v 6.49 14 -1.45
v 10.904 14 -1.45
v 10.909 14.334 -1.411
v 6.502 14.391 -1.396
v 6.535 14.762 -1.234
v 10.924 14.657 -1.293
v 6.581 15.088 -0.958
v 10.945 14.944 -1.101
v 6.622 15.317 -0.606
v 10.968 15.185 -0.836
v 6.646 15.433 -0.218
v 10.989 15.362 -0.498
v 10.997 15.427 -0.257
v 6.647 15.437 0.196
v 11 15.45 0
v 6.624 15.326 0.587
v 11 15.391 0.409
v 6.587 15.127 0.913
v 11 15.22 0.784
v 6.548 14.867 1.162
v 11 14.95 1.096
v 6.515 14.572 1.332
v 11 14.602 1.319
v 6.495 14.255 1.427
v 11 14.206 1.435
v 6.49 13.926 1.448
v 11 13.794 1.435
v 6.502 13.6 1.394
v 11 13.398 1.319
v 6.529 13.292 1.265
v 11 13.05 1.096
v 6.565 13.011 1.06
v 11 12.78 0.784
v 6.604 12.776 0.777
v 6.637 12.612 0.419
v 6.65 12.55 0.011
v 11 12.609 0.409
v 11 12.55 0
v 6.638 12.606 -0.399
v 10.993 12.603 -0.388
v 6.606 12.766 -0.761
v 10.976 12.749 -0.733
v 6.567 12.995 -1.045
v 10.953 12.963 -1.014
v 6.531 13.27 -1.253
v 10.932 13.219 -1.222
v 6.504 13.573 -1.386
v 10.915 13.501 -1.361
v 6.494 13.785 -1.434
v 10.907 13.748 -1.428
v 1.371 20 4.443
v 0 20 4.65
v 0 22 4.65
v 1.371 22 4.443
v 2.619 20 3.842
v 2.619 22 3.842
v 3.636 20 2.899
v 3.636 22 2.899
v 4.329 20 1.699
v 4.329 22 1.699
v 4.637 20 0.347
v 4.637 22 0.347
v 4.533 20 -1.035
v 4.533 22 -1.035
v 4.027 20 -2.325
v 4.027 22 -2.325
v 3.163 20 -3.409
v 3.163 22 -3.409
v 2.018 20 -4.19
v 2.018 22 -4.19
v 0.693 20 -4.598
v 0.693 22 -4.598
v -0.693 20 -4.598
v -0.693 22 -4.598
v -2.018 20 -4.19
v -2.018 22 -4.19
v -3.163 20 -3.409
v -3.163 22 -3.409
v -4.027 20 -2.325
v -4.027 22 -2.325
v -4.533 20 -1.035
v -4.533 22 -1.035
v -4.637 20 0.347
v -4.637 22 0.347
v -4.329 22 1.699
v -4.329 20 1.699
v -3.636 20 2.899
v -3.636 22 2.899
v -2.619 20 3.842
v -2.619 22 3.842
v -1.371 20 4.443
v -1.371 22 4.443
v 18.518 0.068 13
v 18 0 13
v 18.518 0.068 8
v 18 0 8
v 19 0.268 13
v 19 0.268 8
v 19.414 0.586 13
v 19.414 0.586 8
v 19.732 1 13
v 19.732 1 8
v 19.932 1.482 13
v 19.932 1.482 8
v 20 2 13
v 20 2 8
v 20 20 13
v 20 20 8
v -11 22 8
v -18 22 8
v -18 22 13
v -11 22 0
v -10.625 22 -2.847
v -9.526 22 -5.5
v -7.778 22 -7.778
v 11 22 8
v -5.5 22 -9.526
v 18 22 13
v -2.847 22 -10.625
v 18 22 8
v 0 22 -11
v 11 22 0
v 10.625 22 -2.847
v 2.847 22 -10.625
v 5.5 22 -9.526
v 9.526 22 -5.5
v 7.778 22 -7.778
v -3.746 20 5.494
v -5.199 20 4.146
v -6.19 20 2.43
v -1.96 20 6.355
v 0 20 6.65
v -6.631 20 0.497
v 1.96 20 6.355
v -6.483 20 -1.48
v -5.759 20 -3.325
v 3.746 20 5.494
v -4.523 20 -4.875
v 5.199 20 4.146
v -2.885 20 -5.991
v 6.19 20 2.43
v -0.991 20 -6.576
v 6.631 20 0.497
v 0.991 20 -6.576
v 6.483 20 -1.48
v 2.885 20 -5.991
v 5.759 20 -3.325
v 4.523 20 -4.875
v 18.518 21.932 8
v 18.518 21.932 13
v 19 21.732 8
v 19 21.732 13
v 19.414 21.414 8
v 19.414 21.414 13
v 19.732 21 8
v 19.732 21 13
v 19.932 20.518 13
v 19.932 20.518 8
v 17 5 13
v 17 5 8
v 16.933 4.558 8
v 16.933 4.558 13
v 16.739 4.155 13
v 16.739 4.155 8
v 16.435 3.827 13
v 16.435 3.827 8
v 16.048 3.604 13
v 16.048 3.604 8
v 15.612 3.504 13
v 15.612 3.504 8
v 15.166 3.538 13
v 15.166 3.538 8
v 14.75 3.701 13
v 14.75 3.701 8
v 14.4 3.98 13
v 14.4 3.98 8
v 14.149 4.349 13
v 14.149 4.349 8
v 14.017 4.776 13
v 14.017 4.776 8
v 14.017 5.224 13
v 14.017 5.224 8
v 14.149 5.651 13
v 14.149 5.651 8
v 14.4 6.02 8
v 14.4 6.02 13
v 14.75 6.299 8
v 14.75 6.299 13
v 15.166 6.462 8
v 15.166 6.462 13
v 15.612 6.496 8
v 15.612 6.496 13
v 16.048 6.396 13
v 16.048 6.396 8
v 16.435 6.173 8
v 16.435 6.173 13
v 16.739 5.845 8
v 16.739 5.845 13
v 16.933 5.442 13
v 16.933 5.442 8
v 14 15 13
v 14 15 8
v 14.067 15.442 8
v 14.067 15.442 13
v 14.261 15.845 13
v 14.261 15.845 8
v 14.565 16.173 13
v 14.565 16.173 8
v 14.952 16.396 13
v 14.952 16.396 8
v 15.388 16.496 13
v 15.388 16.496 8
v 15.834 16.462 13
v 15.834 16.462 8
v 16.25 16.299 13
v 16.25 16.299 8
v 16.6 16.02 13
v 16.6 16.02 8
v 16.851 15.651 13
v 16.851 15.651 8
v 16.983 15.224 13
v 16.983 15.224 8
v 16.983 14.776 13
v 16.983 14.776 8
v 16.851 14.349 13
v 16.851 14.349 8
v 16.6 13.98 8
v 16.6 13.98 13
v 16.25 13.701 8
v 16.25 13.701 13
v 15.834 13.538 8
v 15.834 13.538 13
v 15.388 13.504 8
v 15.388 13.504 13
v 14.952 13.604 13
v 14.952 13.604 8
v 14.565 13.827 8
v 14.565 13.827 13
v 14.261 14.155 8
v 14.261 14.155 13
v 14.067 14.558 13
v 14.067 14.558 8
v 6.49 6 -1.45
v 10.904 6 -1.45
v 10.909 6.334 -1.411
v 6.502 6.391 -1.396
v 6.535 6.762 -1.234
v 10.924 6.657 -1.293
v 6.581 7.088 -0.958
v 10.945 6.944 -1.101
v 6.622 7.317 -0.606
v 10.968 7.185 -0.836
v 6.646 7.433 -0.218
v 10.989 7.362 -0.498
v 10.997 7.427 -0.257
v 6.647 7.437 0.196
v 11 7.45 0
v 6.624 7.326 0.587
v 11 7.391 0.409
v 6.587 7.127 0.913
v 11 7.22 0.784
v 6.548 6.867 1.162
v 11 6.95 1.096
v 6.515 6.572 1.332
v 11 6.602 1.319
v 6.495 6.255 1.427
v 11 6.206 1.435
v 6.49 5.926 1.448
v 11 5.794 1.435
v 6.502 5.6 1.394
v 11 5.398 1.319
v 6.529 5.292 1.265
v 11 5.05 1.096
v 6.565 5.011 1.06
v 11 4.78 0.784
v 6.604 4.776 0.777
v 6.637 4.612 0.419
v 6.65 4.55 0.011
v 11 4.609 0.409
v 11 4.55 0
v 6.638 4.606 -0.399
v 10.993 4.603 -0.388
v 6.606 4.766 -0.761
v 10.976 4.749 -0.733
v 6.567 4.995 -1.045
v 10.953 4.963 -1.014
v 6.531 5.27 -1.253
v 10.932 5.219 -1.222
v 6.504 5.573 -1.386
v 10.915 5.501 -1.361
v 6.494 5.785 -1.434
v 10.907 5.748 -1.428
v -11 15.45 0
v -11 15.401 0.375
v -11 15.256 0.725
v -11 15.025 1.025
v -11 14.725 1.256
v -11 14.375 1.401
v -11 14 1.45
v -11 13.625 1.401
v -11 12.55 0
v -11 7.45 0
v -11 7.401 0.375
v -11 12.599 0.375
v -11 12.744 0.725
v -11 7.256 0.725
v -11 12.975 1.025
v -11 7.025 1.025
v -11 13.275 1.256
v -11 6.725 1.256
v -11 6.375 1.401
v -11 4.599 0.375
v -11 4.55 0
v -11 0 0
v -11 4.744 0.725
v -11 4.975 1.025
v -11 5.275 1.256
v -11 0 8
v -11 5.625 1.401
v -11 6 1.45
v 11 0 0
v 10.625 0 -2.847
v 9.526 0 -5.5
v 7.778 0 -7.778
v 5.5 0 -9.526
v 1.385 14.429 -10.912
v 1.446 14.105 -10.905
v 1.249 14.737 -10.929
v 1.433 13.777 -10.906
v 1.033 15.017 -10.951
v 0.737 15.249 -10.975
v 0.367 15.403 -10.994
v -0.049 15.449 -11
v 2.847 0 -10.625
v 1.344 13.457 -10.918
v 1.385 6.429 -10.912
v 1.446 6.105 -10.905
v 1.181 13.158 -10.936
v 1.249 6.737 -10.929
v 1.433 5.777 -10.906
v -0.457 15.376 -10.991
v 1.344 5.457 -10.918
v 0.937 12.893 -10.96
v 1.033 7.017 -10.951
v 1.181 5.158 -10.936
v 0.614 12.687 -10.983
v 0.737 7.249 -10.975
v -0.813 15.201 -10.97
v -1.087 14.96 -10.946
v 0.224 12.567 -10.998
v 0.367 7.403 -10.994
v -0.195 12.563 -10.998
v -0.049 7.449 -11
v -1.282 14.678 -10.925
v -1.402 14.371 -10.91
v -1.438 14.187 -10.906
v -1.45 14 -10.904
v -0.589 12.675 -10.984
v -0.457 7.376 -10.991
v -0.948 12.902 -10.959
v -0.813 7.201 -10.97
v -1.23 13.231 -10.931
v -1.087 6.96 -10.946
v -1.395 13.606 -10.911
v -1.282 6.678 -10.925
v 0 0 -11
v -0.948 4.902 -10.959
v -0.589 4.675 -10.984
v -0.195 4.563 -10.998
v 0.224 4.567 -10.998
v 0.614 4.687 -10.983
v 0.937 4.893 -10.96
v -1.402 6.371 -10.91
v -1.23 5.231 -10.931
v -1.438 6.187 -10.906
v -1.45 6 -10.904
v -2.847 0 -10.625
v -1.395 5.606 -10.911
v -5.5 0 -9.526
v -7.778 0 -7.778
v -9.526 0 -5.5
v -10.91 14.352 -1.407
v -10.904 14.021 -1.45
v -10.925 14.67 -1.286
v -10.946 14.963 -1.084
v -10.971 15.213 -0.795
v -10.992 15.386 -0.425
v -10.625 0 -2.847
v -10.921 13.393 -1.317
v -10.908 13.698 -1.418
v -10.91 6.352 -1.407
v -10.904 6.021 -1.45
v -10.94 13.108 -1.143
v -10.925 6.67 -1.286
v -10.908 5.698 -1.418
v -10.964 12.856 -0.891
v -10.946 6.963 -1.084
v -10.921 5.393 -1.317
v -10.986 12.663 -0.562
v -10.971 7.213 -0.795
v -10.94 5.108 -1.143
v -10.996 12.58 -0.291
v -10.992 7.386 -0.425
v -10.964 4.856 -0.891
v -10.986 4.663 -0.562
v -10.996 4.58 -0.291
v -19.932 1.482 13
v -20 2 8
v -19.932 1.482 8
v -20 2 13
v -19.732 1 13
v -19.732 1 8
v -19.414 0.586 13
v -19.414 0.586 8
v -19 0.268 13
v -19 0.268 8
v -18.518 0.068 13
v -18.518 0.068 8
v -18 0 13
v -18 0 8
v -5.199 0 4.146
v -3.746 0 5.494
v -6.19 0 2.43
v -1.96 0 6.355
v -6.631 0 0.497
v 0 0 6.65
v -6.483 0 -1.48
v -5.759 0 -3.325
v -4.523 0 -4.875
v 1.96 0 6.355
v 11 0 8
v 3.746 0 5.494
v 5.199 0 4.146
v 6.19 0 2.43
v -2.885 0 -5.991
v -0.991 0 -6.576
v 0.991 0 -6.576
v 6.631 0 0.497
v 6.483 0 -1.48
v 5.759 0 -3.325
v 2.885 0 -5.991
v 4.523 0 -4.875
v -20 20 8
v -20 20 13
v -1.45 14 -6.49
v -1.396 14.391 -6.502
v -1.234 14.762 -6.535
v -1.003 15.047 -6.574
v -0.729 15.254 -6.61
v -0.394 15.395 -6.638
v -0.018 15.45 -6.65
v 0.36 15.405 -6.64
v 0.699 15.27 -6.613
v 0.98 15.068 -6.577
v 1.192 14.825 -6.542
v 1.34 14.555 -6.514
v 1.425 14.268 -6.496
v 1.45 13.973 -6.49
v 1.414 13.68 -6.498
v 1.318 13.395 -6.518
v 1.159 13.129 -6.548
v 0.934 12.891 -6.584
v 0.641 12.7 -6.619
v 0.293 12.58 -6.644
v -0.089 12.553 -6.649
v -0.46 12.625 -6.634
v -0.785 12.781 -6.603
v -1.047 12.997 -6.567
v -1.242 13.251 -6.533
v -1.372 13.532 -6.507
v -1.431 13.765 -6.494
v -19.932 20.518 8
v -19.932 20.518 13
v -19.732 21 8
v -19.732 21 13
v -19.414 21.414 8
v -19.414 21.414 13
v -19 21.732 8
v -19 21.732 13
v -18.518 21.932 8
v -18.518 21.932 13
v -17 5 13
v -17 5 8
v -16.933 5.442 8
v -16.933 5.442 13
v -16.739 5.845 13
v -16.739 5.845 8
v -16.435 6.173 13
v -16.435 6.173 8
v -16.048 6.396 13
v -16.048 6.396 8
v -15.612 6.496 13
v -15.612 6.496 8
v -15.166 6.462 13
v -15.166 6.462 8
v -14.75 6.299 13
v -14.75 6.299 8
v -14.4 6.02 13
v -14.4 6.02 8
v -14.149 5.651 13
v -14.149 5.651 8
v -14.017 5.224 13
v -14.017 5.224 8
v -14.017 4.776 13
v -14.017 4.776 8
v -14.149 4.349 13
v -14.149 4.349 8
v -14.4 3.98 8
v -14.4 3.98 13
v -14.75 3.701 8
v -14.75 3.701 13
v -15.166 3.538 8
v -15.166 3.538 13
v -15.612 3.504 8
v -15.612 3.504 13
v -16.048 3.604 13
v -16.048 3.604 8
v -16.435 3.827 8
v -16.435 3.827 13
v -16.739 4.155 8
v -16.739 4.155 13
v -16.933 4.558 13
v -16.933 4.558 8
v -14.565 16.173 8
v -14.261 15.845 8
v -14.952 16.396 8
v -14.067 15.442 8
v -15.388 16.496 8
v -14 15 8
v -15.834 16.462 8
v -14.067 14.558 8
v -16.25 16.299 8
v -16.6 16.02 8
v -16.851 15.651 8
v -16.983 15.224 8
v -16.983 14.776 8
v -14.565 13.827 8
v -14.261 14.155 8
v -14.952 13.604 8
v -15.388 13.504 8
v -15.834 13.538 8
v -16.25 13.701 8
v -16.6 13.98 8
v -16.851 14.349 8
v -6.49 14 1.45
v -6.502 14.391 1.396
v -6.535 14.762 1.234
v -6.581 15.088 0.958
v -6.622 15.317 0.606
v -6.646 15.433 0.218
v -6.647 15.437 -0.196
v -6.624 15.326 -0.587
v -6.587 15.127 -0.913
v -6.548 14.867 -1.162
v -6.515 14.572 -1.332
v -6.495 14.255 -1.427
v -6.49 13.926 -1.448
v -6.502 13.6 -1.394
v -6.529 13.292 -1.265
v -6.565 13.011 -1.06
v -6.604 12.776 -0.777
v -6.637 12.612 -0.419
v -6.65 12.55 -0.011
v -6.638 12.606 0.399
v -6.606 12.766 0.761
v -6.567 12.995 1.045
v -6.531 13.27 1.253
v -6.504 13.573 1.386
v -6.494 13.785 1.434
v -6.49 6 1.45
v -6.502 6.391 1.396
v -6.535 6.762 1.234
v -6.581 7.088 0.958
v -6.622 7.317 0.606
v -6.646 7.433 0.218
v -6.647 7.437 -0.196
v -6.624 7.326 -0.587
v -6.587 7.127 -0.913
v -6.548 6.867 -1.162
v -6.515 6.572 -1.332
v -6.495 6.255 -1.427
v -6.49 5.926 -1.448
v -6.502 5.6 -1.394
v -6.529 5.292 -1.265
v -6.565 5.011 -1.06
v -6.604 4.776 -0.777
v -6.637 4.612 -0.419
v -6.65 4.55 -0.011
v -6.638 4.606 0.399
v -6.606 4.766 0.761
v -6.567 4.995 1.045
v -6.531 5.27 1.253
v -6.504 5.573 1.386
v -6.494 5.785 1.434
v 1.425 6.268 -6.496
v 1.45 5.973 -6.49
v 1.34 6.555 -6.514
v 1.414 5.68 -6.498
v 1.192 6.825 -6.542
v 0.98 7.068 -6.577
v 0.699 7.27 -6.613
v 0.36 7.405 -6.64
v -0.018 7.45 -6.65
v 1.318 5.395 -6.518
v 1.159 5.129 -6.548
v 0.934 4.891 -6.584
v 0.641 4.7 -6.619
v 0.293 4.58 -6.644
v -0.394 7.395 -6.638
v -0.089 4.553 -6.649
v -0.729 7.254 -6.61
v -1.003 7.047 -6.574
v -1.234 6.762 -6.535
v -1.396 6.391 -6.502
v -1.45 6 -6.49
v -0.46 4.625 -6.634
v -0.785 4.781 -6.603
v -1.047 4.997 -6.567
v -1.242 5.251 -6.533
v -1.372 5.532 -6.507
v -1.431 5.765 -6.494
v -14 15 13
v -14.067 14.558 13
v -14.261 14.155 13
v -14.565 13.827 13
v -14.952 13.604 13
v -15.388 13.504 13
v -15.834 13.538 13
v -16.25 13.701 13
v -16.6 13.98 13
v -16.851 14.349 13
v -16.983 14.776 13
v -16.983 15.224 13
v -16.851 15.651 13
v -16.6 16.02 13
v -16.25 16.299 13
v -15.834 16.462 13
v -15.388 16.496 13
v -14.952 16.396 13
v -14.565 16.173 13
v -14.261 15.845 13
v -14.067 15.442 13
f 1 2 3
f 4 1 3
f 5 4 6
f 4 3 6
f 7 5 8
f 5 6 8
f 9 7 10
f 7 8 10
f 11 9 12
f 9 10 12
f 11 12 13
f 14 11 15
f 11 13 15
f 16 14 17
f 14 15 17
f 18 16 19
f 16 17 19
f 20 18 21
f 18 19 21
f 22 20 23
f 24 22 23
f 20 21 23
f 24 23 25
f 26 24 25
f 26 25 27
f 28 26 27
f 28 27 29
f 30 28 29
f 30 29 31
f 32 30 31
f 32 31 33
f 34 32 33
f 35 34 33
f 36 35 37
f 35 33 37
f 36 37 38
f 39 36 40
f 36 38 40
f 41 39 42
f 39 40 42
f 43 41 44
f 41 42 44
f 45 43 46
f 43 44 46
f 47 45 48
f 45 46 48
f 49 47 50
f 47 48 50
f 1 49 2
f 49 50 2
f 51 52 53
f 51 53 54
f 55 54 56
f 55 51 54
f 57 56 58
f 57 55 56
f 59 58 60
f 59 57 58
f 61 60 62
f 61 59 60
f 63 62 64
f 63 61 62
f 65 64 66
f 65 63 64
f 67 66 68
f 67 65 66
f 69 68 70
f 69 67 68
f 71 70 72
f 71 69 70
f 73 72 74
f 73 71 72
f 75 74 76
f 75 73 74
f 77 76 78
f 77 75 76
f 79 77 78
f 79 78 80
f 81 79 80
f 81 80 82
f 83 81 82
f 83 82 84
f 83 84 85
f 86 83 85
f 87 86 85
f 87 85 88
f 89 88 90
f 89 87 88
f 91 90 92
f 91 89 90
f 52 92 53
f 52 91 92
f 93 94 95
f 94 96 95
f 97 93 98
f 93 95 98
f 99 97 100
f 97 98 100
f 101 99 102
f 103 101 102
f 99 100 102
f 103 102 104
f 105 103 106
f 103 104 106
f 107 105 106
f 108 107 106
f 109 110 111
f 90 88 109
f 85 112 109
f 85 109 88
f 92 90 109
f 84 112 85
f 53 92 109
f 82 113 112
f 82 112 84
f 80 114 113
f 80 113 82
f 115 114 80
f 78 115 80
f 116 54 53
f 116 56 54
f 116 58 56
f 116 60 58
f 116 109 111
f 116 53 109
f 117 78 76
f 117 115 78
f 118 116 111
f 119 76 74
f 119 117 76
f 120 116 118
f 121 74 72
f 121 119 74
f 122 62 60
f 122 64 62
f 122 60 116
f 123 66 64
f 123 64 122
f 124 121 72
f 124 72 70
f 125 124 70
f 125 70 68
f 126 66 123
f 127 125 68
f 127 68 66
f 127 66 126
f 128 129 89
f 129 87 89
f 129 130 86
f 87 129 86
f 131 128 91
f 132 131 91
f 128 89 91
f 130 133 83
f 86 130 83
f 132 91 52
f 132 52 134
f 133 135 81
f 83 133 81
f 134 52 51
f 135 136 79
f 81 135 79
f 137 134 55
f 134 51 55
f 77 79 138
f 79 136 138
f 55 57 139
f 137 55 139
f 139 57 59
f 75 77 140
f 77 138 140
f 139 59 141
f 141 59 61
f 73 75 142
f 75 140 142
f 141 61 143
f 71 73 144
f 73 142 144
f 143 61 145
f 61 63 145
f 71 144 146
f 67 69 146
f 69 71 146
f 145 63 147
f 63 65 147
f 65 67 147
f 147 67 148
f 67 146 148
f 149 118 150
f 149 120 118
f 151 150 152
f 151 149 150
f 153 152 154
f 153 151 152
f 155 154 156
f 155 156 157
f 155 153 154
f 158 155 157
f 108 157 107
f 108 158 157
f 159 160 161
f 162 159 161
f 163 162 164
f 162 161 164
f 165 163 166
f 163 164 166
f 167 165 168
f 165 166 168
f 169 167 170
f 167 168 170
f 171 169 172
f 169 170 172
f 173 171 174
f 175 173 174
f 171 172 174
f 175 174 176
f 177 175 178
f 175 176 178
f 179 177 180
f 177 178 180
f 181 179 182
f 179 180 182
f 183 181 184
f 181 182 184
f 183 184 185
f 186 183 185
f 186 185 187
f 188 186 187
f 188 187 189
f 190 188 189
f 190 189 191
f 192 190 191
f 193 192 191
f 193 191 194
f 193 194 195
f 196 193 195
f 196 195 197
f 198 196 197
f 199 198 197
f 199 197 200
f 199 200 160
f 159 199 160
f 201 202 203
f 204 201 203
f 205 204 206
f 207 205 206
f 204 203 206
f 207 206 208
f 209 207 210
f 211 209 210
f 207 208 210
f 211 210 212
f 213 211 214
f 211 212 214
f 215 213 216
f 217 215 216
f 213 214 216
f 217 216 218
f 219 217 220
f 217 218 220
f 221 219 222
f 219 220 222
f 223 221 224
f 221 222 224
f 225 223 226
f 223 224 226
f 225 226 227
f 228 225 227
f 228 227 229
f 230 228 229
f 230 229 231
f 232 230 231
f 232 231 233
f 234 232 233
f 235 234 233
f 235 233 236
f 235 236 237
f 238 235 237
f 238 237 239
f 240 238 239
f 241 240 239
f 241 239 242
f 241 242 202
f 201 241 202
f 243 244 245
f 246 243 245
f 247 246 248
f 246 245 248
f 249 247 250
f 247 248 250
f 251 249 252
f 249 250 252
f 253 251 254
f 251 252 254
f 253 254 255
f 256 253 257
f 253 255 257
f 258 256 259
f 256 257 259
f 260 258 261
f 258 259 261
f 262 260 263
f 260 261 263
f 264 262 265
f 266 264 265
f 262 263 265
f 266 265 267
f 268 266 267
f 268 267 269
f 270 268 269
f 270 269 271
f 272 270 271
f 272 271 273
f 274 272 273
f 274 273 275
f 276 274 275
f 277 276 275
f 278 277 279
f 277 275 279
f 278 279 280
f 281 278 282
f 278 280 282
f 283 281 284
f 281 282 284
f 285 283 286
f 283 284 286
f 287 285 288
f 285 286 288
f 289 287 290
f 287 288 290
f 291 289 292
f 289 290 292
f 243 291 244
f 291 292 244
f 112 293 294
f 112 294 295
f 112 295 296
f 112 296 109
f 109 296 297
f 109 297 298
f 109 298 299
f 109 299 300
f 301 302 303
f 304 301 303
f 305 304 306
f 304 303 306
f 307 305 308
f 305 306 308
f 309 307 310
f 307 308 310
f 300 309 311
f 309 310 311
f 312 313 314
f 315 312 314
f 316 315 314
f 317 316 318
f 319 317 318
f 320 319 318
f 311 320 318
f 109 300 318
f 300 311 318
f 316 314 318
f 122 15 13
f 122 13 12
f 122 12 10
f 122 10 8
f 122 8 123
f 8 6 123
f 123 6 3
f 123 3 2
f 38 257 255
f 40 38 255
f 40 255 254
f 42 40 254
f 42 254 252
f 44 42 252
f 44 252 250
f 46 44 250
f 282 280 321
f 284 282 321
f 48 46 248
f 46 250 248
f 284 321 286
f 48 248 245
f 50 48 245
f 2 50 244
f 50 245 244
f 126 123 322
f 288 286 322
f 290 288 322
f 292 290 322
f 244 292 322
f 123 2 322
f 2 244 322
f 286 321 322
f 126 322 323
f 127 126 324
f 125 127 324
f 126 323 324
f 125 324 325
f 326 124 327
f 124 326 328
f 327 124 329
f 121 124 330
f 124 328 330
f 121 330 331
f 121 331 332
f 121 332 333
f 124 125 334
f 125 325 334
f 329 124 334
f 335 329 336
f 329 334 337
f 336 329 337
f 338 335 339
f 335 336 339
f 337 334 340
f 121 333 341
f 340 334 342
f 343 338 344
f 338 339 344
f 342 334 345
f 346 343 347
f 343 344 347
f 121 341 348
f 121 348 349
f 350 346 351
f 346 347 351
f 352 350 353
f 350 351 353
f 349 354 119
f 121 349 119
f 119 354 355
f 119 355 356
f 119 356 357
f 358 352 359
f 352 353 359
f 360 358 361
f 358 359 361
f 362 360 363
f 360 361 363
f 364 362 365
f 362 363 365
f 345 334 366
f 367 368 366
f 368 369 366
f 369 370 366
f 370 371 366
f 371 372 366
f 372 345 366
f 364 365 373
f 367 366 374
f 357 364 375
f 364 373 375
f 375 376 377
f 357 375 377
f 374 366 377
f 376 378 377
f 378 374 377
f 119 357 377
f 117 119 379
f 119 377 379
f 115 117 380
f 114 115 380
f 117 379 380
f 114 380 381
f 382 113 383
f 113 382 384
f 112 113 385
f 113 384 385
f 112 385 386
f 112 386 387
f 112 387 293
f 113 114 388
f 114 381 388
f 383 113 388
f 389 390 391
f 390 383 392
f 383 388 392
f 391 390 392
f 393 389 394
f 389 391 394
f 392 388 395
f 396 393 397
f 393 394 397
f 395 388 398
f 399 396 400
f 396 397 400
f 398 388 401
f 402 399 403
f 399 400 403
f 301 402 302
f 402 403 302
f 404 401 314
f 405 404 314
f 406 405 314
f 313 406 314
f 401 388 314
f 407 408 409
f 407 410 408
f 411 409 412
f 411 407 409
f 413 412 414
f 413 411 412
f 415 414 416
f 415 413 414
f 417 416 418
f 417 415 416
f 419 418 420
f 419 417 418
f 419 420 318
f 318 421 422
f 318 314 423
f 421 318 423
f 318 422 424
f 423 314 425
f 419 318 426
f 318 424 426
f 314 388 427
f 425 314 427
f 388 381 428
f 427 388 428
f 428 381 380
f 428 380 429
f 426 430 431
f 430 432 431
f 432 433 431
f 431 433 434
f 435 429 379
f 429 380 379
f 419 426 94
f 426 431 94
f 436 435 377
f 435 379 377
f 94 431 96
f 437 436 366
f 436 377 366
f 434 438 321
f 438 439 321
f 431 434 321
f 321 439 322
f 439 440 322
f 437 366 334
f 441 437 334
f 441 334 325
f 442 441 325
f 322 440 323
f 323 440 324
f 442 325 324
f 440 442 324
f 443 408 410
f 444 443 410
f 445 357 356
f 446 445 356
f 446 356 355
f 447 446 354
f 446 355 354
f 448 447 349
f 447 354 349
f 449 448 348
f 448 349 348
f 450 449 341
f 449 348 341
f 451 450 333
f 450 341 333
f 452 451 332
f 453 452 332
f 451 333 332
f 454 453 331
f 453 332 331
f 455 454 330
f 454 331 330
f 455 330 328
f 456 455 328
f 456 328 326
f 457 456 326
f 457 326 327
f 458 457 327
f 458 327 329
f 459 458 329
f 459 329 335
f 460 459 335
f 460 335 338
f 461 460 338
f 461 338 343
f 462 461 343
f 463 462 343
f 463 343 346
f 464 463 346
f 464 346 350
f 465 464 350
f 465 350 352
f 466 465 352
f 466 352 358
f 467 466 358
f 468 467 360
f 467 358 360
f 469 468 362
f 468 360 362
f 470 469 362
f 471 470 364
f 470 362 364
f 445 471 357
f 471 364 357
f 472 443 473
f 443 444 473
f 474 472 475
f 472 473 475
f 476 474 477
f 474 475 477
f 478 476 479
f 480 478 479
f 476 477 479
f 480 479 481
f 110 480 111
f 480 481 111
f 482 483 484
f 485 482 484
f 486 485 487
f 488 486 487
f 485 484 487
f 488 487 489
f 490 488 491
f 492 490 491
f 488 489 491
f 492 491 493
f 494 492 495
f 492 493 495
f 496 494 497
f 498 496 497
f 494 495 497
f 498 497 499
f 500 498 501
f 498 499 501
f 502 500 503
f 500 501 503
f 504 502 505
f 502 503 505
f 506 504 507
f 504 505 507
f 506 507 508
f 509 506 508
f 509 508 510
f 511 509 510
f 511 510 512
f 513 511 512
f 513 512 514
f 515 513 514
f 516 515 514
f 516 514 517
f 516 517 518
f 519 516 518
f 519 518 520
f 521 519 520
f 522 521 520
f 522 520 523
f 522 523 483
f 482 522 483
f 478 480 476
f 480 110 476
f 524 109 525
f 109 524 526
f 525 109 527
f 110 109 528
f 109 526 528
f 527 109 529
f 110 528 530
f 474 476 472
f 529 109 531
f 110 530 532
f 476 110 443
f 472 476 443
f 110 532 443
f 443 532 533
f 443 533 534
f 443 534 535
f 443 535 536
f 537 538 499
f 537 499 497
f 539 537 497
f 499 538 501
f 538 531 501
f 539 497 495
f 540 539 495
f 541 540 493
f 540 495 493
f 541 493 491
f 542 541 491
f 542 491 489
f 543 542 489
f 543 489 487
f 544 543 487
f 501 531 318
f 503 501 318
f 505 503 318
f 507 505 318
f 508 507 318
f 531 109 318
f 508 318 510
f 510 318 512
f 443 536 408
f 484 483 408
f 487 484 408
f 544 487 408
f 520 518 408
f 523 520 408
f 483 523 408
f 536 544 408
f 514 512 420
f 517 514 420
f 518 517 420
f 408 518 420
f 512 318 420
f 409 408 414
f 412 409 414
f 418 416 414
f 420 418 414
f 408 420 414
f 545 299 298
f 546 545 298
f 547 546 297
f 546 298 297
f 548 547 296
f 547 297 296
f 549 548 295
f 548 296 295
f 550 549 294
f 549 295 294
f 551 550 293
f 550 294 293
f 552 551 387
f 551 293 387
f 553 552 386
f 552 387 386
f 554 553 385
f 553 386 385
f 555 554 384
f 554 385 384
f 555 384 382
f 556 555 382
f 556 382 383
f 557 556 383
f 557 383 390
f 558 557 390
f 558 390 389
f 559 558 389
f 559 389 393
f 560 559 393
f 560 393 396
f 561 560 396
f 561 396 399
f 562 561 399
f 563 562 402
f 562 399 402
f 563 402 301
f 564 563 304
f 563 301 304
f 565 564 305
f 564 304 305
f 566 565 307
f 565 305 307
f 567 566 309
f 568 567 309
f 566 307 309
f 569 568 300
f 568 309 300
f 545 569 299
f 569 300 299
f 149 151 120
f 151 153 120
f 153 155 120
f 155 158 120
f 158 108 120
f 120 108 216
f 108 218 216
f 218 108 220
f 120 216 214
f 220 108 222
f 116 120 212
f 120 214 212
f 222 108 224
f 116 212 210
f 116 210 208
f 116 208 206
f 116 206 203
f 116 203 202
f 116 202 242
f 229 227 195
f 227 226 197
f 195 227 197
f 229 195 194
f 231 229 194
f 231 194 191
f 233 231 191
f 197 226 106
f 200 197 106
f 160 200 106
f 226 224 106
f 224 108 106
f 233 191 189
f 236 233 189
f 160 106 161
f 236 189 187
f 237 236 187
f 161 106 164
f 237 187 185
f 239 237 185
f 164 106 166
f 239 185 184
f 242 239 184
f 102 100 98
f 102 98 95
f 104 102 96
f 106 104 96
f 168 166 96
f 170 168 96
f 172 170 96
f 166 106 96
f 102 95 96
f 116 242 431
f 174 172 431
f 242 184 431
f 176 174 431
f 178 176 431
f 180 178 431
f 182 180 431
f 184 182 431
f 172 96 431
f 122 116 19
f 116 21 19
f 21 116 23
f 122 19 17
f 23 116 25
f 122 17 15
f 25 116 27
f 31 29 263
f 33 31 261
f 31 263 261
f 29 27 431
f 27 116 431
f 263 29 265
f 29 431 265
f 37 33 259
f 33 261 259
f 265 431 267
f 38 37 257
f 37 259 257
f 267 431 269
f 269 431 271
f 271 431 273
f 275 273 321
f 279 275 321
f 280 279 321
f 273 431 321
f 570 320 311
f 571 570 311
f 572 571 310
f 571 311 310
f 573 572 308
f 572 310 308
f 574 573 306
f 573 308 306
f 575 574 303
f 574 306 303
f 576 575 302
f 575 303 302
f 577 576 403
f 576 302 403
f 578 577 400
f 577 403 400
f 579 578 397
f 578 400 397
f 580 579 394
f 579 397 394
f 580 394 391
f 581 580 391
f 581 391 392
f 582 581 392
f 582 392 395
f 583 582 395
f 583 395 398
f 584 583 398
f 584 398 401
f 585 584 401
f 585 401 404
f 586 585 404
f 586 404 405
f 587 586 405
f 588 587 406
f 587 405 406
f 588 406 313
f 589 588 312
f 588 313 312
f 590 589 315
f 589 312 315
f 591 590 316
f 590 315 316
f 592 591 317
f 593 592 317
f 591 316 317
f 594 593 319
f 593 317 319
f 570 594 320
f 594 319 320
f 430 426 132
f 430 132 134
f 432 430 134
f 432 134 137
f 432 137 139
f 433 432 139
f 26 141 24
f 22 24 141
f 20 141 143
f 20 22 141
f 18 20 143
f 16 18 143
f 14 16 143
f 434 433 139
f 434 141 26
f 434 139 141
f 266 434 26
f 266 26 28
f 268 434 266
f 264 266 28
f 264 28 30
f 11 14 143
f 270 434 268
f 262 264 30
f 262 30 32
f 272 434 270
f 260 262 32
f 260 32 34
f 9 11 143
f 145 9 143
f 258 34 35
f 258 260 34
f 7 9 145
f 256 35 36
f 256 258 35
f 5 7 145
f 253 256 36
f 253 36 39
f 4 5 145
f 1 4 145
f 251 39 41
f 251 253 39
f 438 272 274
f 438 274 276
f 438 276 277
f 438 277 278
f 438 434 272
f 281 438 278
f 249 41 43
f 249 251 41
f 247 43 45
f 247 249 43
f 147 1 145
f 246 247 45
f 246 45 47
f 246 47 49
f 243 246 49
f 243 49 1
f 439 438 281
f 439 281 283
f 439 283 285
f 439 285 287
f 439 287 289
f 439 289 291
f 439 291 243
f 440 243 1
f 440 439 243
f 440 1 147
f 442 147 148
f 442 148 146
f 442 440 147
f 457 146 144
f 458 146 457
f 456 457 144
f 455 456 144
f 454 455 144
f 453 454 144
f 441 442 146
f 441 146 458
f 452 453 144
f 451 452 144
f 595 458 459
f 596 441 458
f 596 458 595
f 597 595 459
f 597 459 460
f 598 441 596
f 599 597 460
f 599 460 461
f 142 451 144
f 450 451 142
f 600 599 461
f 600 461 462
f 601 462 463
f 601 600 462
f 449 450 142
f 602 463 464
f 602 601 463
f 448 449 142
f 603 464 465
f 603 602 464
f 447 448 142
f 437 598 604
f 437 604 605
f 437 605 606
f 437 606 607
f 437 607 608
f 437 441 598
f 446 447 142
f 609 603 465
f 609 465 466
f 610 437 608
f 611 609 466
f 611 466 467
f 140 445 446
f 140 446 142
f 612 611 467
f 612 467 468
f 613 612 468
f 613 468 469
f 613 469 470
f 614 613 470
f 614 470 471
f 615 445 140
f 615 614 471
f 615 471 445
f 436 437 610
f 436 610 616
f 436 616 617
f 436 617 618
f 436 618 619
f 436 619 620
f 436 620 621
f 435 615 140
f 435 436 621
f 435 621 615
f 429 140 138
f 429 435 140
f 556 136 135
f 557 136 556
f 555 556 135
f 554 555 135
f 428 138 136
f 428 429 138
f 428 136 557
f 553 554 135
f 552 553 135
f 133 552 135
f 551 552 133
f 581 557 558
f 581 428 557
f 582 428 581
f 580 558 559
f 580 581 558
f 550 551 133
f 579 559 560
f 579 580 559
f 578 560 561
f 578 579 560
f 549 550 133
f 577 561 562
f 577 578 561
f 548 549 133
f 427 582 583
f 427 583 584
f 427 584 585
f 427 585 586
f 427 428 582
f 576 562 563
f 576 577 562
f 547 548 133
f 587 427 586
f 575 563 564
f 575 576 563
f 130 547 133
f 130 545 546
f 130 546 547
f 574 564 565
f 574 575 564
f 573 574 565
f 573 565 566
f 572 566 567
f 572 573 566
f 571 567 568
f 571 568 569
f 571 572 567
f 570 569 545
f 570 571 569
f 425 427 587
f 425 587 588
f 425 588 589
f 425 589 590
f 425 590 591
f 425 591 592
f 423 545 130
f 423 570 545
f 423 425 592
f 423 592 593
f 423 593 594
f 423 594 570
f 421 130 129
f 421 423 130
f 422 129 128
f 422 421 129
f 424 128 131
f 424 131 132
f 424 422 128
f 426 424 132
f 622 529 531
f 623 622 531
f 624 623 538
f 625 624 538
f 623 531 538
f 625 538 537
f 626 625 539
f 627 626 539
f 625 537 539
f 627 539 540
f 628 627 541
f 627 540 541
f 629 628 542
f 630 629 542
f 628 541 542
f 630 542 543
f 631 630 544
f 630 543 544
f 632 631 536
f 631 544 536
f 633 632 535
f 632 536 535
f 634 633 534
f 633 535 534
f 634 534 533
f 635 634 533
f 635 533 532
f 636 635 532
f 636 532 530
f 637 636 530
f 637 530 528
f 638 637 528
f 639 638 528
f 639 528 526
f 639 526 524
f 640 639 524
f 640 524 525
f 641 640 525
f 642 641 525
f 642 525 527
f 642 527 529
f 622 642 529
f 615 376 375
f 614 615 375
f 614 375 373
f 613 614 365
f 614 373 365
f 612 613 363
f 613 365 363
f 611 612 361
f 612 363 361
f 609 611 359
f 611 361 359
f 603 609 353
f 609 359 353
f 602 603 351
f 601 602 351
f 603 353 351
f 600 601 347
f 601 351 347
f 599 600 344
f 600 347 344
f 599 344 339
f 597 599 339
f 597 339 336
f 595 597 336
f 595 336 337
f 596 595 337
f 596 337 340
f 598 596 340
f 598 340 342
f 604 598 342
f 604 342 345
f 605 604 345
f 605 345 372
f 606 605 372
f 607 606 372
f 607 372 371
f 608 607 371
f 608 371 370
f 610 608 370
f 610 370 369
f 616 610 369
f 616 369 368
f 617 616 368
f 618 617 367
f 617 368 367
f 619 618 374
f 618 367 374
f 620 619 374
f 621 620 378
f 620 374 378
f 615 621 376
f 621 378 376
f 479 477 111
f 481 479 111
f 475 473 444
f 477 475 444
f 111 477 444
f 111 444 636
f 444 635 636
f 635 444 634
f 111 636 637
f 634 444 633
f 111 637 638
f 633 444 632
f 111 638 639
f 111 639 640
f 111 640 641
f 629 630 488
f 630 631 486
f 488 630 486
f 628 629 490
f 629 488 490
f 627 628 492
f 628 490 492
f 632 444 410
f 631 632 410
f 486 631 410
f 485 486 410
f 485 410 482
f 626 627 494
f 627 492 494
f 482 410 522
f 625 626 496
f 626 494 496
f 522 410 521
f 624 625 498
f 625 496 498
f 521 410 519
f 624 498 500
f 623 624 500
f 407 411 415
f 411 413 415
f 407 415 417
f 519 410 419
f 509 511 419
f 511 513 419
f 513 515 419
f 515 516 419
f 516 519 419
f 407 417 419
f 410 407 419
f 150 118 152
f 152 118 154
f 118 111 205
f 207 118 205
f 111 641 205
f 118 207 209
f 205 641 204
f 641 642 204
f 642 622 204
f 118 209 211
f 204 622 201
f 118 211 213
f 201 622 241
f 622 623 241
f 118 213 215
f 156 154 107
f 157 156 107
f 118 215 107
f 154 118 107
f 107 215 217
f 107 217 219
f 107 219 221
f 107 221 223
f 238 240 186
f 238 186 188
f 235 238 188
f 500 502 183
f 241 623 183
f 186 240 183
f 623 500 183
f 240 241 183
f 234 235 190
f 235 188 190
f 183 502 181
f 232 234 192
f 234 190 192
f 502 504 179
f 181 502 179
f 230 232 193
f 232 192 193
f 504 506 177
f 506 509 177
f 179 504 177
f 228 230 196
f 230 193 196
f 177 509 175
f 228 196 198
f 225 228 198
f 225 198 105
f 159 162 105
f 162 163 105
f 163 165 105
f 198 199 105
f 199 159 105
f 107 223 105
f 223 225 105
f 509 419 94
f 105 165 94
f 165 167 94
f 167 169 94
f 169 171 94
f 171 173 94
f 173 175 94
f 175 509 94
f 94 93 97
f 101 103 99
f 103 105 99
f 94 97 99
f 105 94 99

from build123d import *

# Parameters (mm, degrees)
SKETCH_1_R               = 6.65
EXTRUDE_1_DEPTH          = 20
SKETCH_2_R               = 1.5
CUT_EXTRUDE_1_DEPTH      = 35.073450075
SKETCH_3_R               = 1.45
CUT_EXTRUDE_2_DEPTH      = 10
PATTERN_CIRCULAR_1_COUNT = 2
PATTERN_CIRCULAR_1_ANGLE = 90
F_1_THE_OTHER_WAY_COUNT  = 2
F_1_THE_OTHER_WAY_ANGLE  = 90
SKETCH_4_R               = 4.65
EXTRUDE_2_DEPTH          = 2
FILLET_1_R               = 2


with BuildPart() as part:
    # 草图1 → 凸台-拉伸1 (new body)
    with BuildSketch(Plane(origin=(0, 0, 0), x_dir=(1, 0, 0), z_dir=(0, 1, 0))):
        with BuildLine():
            Line((-11, 0), (-11, -8))
            Line((-11, -8), (-20, -8))
            Line((-20, -8), (-20, -13))
            Line((-20, -13), (20, -13))
            Line((20, -13), (20, -8))
            Line((20, -8), (11, -8))
            Line((11, -8), (11, 0))
            ThreePointArc((11, 0), (0, 11), (-11, 0))
        make_face()
        with Locations(Location((0, 0, 0), (0, 0, 270))):
            Circle(SKETCH_1_R, mode=Mode.SUBTRACT)
    extrude(amount=EXTRUDE_1_DEPTH)

    # 草图2 → 切除-拉伸1 (cut, through all)
    with BuildSketch(Plane(origin=(0, 0, 8), x_dir=(-1, 0, 0), z_dir=(0, 0, -1))):
        with Locations((15.5, 5)):
            Circle(SKETCH_2_R)
        with Locations(Location((15.5, 15, 0), (0, 0, 180))):
            Circle(SKETCH_2_R)
        with Locations((-15.5, 15)):
            Circle(SKETCH_2_R)
        with Locations(Location((-15.5, 5, 0), (0, 0, 180))):
            Circle(SKETCH_2_R)
    extrude(amount=-CUT_EXTRUDE_1_DEPTH, mode=Mode.SUBTRACT)

    # 草图3 → 切除-拉伸2 (cut)
    with BuildSketch(Plane(origin=(0, 0, -11), x_dir=(-1, 0, 0), z_dir=(0, 0, -1))):
        with Locations((0, 6)):
            Circle(SKETCH_3_R)
        with Locations((0, 14)):
            Circle(SKETCH_3_R)
    cut_extrude_2 = extrude(amount=-CUT_EXTRUDE_2_DEPTH, mode=Mode.SUBTRACT)

    # 阵列(圆周)1: 切除-拉伸2 ×2 about axis
    pattern_circular_1_axis = Axis((0, 20, 0), (0, -1, 0))
    for i in range(1, PATTERN_CIRCULAR_1_COUNT):
        add(cut_extrude_2.rotate(pattern_circular_1_axis, i * PATTERN_CIRCULAR_1_ANGLE / (PATTERN_CIRCULAR_1_COUNT - 1)), mode=Mode.SUBTRACT)

    # 1 the other way: 切除-拉伸2 ×2 about axis
    f_1_the_other_way_axis = Axis((0, 20, 0), (0, 1, 0))
    for i in range(1, F_1_THE_OTHER_WAY_COUNT):
        add(cut_extrude_2.rotate(f_1_the_other_way_axis, i * F_1_THE_OTHER_WAY_ANGLE / (F_1_THE_OTHER_WAY_COUNT - 1)), mode=Mode.SUBTRACT)

    # 草图4 → 凸台-拉伸2 (add)
    with BuildSketch(Plane(origin=(0, 20, 0), x_dir=(1, 0, 0), z_dir=(0, 1, 0))):
        with BuildLine():
            Line((20, -8), (11, -8))
            Line((11, -8), (11, 0))
            ThreePointArc((11, 0), (0, 11), (-11, 0))
            Line((-11, 0), (-11, -8))
            Line((-11, -8), (-20, -8))
            Line((-20, -8), (-20, -13))
            Line((-20, -13), (20, -13))
            Line((20, -13), (20, -8))
        make_face()
        with Locations(Location((0, 0, 0), (0, 0, 270))):
            Circle(SKETCH_4_R, mode=Mode.SUBTRACT)
    extrude(amount=EXTRUDE_2_DEPTH)

    # 圆角1
    fillet_1_edges = [part.edges().sort_by_distance(p)[0] for p in [
        (20, 0, 10.5),
        (-20, 0, 10.5),
        (20, 22, 10.5),
        (-20, 22, 10.5),
    ]]
    fillet(fillet_1_edges, radius=FILLET_1_R)


solid = part.part
